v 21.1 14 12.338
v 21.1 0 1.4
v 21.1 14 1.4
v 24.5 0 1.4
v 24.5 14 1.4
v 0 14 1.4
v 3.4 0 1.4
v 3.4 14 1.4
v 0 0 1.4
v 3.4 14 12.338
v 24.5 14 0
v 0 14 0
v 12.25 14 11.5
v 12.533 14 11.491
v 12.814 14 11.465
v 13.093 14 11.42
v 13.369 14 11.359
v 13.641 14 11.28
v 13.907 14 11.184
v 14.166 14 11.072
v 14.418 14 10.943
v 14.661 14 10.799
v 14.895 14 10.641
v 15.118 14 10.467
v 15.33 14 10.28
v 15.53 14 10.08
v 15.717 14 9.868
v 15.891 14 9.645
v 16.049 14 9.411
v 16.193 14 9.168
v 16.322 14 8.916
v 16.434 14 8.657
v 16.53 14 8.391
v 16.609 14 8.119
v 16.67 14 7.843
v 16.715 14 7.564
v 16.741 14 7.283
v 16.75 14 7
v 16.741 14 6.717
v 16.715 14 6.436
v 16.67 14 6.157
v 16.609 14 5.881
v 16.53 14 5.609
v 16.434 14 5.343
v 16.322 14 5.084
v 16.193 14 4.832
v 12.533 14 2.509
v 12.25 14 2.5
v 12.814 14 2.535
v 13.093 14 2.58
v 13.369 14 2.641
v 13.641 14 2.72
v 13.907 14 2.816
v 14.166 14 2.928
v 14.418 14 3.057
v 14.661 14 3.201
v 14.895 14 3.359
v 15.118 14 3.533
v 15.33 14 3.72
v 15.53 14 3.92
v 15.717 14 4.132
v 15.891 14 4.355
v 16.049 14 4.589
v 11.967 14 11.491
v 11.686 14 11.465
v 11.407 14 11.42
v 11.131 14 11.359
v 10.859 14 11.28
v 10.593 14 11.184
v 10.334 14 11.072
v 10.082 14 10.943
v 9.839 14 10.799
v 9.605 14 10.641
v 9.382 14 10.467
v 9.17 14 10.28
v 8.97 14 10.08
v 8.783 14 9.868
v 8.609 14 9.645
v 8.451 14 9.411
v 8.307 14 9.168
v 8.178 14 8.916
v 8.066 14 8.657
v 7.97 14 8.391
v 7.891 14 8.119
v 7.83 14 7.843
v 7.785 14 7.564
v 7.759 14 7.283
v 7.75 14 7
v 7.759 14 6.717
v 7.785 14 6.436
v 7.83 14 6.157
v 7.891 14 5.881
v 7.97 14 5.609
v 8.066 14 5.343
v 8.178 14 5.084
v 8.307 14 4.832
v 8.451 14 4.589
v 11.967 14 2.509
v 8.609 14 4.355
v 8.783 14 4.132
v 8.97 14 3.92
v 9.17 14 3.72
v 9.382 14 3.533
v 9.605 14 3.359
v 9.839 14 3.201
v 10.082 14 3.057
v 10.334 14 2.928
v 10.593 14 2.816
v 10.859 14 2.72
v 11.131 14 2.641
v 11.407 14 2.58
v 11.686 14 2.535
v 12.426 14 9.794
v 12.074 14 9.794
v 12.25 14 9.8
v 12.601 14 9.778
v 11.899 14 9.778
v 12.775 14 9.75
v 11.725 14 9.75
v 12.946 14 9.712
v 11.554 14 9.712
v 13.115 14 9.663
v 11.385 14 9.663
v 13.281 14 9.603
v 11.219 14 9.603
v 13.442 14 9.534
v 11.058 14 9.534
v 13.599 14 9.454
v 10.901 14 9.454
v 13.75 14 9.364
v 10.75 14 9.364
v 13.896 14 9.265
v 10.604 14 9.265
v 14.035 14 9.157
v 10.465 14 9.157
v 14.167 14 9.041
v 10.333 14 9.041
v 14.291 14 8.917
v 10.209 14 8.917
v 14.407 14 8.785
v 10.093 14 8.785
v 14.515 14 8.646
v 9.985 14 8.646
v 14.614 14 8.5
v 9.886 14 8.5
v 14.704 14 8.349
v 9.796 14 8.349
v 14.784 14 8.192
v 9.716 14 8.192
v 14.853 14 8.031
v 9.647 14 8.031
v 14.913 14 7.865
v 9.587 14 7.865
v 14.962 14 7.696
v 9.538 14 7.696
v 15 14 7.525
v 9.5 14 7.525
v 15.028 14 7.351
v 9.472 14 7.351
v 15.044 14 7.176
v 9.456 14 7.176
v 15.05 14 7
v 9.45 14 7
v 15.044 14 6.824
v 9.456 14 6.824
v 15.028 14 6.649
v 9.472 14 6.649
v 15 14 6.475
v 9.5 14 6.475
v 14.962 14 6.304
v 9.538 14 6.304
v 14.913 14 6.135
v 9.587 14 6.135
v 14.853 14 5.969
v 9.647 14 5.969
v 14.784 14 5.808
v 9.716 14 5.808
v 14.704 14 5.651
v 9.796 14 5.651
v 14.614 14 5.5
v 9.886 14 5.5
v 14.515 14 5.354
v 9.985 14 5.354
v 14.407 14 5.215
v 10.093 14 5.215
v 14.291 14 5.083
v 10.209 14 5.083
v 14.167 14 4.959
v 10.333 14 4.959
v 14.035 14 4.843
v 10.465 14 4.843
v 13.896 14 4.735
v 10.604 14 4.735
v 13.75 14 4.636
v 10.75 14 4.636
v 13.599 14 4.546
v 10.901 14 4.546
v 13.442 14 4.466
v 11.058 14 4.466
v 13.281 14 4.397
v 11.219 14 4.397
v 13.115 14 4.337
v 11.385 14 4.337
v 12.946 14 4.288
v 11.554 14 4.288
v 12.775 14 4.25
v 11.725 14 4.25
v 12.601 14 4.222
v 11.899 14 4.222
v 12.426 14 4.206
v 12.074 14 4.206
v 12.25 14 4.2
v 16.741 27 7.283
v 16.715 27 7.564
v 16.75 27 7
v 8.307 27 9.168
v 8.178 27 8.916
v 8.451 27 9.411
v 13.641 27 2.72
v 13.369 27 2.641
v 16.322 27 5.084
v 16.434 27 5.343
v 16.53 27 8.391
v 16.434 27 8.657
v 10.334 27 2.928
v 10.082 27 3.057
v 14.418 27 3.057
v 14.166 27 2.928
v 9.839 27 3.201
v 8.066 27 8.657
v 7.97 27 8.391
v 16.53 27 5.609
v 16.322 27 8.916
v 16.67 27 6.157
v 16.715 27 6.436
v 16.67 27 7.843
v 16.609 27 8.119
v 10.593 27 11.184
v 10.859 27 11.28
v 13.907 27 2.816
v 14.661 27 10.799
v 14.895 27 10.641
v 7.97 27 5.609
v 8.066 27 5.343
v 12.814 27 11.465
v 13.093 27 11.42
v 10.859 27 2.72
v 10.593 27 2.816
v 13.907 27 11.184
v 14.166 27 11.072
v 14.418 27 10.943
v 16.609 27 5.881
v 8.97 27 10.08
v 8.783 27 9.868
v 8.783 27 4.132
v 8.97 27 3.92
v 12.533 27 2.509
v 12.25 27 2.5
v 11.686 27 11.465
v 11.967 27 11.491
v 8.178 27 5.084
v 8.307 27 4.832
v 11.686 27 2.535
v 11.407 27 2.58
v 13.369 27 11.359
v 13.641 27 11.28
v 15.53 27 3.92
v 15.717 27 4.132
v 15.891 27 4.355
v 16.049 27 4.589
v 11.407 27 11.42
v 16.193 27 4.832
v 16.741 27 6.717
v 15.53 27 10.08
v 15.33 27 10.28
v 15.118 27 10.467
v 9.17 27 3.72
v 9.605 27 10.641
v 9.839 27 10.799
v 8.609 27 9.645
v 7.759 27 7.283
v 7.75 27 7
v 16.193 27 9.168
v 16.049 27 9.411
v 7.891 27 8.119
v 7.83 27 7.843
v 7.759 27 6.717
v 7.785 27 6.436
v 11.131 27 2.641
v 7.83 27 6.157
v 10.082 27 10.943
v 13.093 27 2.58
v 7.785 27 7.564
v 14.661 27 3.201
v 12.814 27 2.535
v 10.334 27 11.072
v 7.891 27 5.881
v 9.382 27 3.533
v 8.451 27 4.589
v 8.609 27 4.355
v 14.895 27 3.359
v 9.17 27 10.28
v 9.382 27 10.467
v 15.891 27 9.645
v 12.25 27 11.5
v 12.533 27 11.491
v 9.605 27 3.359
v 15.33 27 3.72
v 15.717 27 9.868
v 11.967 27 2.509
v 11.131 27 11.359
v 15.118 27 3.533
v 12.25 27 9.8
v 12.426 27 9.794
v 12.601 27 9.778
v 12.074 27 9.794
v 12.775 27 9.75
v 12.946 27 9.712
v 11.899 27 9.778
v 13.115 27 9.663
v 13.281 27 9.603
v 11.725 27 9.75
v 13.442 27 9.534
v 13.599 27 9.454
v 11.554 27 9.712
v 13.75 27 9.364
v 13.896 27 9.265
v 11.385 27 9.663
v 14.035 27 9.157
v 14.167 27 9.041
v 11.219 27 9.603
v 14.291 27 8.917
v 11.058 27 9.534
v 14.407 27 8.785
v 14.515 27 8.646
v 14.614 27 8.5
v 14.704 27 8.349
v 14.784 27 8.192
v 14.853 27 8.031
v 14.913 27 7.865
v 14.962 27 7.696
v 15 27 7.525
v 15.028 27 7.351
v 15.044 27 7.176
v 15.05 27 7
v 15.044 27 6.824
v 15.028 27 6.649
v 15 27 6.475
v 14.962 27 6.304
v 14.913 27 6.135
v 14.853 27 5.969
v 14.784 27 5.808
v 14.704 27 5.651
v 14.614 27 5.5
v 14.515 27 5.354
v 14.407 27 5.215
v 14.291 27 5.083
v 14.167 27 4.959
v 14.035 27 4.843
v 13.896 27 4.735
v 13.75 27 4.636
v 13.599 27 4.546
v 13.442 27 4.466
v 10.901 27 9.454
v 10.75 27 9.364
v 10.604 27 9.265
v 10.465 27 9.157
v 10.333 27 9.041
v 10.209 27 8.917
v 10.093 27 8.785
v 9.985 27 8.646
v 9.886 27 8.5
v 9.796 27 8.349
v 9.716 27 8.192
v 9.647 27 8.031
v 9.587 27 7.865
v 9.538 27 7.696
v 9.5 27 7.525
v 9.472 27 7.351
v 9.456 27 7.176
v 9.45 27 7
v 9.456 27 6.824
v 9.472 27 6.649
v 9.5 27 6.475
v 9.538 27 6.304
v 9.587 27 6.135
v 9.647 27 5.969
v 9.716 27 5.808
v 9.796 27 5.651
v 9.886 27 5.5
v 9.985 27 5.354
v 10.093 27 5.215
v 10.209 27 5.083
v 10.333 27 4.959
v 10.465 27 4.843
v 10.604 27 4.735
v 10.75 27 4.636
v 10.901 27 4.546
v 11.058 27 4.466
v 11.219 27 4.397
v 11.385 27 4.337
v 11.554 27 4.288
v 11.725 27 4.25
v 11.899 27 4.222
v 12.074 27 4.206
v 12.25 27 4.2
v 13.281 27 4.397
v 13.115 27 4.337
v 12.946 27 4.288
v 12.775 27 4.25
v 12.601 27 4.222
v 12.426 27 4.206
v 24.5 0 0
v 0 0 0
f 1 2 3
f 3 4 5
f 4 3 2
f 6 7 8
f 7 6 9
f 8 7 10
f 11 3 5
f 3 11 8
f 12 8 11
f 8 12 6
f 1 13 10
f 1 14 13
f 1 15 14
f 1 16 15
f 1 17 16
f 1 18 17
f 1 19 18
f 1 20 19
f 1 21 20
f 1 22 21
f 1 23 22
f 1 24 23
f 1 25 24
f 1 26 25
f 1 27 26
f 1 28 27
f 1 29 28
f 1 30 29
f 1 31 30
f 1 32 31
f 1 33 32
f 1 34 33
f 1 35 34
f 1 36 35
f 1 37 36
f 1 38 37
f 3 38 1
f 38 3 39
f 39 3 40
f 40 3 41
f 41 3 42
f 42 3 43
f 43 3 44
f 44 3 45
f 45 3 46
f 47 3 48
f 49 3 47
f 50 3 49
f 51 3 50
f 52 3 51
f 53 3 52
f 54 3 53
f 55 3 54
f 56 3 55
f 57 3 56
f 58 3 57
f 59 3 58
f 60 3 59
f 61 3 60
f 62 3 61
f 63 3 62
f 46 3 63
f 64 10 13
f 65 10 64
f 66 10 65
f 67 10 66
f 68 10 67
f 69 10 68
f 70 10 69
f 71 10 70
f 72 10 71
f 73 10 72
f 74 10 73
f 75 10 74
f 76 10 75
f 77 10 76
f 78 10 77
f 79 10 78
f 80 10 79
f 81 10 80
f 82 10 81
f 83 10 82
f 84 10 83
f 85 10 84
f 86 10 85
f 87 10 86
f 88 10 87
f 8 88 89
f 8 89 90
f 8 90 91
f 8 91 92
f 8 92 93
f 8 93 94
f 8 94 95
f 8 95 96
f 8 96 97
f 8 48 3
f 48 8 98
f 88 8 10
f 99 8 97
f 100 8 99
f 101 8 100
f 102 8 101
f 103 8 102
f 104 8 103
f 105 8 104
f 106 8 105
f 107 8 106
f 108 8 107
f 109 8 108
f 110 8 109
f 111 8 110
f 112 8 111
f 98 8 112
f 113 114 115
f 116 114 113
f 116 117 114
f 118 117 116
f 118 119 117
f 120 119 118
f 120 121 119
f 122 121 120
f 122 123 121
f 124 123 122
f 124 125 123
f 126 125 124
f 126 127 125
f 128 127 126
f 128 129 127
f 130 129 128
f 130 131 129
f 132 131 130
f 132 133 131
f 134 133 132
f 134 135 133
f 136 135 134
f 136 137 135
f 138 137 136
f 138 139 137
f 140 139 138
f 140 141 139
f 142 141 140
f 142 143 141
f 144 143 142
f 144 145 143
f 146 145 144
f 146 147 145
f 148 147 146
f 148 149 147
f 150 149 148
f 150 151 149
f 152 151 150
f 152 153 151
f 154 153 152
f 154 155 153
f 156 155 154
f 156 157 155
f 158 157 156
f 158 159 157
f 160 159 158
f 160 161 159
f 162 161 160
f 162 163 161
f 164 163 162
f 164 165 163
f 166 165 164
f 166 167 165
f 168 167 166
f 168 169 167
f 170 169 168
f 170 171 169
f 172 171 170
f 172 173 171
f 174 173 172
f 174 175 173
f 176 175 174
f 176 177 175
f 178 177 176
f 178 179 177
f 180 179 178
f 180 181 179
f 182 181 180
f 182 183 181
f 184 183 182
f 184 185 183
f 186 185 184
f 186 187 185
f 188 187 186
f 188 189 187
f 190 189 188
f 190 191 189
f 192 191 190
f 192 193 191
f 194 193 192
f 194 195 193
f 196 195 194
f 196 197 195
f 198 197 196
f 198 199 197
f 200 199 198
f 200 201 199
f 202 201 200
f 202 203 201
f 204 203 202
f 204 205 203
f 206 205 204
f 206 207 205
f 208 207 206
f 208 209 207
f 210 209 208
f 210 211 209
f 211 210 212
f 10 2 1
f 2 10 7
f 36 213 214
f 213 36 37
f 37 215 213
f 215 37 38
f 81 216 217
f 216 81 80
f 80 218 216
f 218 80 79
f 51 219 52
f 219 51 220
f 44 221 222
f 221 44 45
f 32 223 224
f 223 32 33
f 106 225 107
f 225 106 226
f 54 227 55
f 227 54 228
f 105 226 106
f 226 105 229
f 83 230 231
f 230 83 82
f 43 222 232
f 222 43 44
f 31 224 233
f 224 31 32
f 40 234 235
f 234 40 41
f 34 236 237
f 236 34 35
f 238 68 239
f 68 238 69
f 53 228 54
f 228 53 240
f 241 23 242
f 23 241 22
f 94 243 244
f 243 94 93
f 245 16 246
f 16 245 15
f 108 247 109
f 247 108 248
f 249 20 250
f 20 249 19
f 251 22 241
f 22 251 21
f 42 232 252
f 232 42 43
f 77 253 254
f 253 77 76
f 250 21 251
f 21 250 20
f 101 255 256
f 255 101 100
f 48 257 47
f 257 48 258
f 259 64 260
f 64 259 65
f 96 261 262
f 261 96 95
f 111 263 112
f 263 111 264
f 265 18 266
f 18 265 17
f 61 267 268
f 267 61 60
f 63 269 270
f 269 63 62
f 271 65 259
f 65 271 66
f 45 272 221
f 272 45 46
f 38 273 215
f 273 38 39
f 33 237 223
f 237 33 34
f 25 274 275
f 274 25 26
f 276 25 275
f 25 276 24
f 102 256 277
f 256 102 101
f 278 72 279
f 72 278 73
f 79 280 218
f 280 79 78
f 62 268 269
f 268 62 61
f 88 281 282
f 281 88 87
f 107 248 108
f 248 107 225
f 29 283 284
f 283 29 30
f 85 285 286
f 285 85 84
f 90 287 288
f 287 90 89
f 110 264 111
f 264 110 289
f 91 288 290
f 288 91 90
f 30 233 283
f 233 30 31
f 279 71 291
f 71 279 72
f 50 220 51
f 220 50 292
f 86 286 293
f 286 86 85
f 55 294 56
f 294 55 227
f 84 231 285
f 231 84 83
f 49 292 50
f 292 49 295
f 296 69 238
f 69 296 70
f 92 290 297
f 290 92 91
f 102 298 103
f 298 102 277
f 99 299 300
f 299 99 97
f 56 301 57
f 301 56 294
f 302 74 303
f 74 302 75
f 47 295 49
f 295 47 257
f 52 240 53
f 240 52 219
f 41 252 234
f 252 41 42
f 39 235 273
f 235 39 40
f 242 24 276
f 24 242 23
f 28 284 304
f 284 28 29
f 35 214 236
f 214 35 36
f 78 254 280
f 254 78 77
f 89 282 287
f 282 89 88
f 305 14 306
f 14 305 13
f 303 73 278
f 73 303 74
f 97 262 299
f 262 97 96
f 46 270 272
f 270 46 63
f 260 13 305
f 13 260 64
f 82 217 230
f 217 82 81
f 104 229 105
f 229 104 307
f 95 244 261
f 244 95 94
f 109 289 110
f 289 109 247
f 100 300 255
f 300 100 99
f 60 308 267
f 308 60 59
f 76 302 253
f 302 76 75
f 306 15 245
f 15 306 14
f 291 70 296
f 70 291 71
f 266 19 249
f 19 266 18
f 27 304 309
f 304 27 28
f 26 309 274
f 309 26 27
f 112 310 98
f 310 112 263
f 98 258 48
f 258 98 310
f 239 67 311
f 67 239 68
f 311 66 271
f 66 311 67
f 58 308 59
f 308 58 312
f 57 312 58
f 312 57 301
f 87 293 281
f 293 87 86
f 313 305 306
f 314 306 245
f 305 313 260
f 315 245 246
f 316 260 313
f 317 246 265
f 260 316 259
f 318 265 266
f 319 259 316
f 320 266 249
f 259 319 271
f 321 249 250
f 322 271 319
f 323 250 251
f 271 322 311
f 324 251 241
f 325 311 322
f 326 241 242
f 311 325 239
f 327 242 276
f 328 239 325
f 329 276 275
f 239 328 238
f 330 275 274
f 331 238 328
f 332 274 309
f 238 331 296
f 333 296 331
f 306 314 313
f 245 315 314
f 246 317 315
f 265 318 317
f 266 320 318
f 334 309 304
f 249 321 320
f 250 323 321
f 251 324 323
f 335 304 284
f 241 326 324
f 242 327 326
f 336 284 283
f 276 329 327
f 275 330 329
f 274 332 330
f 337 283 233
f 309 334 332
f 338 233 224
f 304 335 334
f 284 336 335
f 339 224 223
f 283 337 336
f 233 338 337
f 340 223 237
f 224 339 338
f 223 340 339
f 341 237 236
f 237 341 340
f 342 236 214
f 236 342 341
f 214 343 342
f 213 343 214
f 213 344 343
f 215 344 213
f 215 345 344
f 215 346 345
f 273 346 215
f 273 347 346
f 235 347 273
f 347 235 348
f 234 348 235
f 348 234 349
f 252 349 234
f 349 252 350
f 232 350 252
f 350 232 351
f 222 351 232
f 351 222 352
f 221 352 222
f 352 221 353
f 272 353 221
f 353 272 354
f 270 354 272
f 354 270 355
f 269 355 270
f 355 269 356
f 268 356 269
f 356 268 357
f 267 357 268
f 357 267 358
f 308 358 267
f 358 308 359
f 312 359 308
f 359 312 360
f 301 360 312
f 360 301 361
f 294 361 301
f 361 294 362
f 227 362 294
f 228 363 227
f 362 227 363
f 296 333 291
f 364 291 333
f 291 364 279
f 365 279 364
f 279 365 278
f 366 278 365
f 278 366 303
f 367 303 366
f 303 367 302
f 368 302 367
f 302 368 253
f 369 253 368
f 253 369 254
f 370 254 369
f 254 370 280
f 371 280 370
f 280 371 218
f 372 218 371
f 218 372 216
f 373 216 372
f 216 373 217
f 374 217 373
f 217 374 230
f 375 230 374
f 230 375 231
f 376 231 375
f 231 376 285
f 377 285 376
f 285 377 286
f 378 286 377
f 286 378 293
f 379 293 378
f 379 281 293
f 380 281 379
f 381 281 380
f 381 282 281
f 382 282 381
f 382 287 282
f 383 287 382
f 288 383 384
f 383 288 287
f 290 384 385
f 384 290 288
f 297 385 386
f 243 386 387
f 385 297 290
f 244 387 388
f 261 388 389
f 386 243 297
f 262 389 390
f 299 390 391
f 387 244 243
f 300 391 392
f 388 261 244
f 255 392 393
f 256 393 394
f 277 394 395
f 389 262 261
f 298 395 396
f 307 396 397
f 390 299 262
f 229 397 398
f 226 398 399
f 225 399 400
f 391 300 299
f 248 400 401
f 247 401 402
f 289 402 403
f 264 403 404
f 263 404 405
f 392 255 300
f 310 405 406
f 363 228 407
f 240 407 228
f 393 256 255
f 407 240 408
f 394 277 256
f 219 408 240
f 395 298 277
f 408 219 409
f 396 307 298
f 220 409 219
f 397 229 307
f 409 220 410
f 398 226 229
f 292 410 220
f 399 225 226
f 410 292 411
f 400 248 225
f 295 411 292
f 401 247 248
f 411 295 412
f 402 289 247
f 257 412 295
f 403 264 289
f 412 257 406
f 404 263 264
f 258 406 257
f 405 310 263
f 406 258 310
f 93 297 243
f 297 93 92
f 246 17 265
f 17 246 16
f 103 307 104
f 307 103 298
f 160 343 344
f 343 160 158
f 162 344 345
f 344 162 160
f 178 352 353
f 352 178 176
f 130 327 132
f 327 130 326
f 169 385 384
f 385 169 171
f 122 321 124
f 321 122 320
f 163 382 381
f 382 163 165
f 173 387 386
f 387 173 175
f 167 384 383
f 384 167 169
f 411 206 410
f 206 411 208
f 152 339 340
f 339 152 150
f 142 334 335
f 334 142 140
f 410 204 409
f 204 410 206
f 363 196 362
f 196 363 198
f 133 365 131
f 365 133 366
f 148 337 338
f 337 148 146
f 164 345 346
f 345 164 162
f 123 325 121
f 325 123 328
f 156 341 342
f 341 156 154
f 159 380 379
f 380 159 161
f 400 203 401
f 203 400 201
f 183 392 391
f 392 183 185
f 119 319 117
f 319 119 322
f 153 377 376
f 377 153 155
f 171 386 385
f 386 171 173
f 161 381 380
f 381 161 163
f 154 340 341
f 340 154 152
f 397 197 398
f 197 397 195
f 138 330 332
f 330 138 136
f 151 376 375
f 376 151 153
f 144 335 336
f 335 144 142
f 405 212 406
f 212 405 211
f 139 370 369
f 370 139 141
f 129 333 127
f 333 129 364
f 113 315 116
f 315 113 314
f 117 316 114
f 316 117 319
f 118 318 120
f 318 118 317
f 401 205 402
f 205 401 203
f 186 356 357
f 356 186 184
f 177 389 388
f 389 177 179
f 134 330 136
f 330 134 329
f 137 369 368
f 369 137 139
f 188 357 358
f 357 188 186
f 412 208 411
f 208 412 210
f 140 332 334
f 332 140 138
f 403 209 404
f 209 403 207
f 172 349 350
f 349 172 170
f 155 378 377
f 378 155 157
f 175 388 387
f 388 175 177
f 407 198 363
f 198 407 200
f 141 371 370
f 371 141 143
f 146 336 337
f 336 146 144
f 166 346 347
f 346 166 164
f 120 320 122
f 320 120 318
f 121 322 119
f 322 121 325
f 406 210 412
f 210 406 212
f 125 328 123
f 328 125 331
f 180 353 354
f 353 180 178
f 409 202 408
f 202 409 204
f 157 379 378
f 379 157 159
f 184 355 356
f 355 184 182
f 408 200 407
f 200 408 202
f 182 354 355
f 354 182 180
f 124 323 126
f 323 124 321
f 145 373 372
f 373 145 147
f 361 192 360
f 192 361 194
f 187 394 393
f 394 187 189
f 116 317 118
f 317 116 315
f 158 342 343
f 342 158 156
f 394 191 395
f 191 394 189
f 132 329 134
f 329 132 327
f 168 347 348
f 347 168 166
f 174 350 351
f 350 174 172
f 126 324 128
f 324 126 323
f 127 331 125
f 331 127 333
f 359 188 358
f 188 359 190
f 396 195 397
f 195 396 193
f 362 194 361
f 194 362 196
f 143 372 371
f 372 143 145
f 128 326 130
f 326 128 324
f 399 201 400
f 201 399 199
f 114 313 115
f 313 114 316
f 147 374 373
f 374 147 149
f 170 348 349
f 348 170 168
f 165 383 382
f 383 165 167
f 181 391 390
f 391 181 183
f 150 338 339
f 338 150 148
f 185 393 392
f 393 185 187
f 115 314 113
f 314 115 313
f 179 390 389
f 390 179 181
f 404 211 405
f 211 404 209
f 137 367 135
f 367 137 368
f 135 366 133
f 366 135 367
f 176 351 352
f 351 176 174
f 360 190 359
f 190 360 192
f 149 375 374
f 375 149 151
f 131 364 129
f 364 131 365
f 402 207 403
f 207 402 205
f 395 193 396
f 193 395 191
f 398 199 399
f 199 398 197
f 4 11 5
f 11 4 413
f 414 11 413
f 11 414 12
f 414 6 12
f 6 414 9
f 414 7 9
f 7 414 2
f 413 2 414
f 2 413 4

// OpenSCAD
/*
 * Door lock part
 * (c) 2020 David Mikulik
 * Licensed under 
 *   Creative Commons 
 *   Attribution Non Comercial Share alike license
 */
 
cube([24.5,14,1.4]);
$fn=100;
 
difference () {
translate([24.5/2-17.7/2,0,1.4])
    cube([17.7,14,13.7-2.7]);
translate([24.5/2-17.7/2,0,1.4])
    rotate([38,0,0])
        cube([27.7,24,13.7-1.4]);
}
    translate([24.5/2,14+13,14/2]) {
        rotate([90,0,0]) {
            difference () {
                cylinder(d=9,h=13);
                translate([0,0,-5]) {
                cylinder(d=5.6,h=23);}
            }
        }
}
